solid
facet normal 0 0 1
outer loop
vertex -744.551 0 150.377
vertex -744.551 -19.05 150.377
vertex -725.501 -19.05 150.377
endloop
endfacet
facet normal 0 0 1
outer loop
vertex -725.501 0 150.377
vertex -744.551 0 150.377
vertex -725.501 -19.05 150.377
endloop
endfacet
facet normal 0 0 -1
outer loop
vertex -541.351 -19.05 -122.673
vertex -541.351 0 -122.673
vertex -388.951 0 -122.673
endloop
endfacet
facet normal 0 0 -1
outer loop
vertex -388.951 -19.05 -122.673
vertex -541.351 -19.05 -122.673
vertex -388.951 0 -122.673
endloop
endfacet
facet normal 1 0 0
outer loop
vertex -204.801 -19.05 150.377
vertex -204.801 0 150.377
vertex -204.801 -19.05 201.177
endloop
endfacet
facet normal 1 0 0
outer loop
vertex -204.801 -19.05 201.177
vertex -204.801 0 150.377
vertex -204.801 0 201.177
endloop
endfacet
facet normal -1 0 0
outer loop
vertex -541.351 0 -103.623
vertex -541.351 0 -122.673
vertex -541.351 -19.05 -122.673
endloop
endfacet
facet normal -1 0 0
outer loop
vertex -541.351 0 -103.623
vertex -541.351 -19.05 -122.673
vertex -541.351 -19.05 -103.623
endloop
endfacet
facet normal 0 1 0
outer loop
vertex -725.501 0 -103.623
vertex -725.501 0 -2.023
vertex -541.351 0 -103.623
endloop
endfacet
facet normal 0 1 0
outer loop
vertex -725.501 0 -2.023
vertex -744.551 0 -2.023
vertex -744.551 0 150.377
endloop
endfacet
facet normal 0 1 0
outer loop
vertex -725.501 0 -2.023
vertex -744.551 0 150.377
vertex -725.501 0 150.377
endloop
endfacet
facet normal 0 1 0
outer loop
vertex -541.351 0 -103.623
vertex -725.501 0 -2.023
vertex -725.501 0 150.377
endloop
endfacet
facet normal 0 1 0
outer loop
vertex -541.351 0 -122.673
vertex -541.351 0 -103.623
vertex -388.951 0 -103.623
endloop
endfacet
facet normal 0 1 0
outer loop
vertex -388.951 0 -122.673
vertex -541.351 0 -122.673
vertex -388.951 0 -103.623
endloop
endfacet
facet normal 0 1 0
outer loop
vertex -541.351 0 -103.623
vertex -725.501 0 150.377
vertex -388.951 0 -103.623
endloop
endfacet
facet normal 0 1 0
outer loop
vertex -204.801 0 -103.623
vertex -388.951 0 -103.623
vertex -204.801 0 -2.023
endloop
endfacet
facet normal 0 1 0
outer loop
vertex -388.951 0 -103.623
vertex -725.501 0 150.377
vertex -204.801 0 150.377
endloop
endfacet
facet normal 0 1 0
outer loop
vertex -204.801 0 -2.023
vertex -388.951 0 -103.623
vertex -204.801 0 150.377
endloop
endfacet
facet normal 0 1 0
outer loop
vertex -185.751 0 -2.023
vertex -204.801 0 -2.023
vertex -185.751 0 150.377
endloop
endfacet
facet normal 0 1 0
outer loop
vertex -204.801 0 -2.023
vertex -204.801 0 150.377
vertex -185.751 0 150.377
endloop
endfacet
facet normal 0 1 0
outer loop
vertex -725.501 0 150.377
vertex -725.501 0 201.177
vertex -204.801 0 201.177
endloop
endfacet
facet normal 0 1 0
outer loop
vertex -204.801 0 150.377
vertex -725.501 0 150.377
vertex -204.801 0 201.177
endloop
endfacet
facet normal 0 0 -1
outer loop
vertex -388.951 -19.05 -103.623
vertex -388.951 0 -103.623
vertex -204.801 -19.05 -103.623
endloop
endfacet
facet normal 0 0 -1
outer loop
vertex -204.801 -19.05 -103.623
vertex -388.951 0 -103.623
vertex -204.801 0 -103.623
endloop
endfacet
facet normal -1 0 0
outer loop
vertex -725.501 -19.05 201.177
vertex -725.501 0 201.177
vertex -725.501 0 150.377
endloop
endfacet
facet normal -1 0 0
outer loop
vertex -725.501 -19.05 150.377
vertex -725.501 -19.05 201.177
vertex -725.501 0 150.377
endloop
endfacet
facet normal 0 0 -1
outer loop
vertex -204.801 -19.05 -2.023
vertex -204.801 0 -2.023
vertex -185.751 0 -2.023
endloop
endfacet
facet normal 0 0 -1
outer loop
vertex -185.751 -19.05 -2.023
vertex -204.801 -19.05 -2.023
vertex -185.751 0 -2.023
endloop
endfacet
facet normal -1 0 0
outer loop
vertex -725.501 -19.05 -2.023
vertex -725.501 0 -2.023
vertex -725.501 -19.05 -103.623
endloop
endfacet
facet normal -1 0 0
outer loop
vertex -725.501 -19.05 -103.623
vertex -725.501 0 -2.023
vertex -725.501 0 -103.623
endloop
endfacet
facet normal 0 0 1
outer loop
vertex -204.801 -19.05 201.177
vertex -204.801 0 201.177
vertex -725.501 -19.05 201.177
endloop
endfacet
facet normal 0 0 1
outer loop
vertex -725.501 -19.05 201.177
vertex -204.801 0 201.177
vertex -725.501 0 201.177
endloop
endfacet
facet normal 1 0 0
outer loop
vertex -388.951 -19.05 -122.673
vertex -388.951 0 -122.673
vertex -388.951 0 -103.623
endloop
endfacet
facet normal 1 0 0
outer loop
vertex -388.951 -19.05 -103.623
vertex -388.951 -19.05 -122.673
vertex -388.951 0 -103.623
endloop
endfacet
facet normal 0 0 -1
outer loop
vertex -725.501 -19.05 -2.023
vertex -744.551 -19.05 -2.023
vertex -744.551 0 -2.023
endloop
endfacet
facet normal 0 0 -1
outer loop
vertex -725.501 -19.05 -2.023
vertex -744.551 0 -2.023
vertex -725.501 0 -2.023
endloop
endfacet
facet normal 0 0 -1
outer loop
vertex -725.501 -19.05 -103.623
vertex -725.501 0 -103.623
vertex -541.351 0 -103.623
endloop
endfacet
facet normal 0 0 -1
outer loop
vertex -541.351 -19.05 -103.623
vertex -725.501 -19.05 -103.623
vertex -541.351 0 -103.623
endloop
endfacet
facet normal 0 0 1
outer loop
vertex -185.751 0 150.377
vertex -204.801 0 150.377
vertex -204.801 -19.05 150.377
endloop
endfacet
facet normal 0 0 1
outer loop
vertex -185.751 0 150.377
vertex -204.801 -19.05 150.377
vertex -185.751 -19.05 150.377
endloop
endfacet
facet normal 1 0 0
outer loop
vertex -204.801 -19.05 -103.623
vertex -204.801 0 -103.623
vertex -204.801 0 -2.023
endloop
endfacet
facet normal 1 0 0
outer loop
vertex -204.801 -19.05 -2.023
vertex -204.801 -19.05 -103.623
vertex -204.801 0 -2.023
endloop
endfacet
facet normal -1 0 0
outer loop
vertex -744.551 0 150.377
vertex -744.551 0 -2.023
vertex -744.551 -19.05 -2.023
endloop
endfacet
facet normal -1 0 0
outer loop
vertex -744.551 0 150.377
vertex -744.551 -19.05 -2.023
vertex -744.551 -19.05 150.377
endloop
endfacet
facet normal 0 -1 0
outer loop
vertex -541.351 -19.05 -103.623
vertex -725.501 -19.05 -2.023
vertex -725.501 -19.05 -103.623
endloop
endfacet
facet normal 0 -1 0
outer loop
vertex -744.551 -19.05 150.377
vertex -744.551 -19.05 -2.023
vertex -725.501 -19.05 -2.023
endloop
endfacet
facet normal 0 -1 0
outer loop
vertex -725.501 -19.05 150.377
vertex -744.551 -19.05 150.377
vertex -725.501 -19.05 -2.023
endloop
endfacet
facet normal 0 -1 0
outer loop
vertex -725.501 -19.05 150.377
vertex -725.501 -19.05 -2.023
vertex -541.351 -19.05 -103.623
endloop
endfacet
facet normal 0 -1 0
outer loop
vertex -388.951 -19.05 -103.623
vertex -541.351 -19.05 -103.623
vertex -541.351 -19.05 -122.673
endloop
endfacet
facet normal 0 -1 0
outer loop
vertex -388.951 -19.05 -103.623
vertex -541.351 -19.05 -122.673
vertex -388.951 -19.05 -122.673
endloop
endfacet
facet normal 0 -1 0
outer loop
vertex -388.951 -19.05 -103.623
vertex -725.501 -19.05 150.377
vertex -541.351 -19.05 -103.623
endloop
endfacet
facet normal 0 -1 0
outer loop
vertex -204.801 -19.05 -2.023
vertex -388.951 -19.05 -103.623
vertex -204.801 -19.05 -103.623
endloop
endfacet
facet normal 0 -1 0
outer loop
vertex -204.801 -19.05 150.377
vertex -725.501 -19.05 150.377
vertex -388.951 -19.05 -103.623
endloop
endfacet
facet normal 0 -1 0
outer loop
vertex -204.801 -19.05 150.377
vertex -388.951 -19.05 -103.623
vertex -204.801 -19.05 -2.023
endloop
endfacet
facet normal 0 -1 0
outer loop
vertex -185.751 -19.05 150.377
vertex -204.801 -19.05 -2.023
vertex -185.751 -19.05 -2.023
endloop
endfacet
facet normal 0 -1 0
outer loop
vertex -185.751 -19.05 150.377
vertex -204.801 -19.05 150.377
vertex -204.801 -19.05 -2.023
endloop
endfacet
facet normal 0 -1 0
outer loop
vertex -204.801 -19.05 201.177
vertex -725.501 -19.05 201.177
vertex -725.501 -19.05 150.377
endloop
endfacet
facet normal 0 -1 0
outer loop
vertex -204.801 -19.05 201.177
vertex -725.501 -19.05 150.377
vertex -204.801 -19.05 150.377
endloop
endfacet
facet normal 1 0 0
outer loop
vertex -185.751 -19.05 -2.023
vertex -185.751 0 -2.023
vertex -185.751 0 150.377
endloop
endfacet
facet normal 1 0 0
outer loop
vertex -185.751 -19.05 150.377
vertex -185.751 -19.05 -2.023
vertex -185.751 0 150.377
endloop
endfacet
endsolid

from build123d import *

# Parameters (mm, degrees)
F0_W     = 19.05
F0_H     = 152.4
F0_W_2   = 152.4
F0_H_2   = 19.05
F1_DEPTH = 19.05


# Not quite as in the source:
# - a feature names something its author has since deleted; it is built from what else it names


with BuildPart() as f1:
    # F0 (on Front) → F1 (new body)
    with BuildSketch(Plane.XZ):
        Polygon((-388.9506477541, -103.6229937509), (-204.8006477541, -103.6229937509), (-204.8006477541, -2.0229937509), (-204.8006477541, 150.3770062491), (-204.8006477541, 201.1770062491), (-725.5006477541, 201.1770062491), (-725.5006477541, 150.3770062491), (-725.5006477541, -2.0229937509), (-725.5006477541, -103.6229937509), (-541.3506477541, -103.6229937509), align=None)
        with Locations((-735.0256477541, 74.1770062491)):
            Rectangle(F0_W, F0_H)
        with Locations((-195.2756477541, 74.1770062491)):
            Rectangle(F0_W, F0_H)
        with Locations((-465.1506477541, -113.1479937509)):
            Rectangle(F0_W_2, F0_H_2)
    extrude(amount=F1_DEPTH)


solid = f1.part
